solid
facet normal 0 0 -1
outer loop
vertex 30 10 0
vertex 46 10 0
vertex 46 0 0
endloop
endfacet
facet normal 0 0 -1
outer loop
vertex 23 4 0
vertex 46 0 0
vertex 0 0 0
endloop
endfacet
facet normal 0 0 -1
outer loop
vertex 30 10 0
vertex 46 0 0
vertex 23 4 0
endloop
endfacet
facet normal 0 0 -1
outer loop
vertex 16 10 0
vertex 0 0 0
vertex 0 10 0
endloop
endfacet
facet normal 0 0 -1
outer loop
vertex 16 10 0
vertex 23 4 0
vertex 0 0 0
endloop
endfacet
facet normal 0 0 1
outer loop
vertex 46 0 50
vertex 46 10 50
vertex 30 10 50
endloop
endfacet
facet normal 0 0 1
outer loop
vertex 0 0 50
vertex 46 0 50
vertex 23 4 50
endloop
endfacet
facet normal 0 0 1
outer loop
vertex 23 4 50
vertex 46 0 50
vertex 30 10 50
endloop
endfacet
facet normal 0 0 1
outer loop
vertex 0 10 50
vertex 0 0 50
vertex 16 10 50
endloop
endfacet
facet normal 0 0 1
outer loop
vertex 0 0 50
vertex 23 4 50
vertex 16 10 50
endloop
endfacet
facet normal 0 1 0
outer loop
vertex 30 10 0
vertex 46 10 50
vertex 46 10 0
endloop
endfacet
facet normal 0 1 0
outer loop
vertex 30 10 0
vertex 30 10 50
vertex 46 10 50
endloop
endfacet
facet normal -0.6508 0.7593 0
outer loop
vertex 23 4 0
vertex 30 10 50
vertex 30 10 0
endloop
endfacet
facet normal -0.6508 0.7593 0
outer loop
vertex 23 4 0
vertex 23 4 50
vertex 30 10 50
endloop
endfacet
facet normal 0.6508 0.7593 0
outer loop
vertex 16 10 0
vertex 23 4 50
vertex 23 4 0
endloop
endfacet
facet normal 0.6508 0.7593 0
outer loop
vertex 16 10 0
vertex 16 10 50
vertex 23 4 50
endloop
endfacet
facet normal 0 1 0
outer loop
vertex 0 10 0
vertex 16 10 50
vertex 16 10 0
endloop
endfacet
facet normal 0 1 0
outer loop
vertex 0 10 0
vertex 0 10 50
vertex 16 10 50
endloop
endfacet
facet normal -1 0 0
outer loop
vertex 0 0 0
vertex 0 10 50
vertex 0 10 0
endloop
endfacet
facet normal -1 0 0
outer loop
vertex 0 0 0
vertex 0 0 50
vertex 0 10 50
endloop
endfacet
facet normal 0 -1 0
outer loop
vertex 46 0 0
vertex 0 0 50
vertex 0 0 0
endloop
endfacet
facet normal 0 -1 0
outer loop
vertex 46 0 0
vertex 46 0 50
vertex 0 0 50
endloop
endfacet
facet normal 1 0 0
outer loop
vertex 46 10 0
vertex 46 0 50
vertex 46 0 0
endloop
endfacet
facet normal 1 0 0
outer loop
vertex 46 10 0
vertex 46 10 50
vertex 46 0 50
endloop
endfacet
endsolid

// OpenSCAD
$fn = 32;

// ----------------------------------------------------------------------
// V guide rail: vway, 46 mm wide
// ----------------------------------------------------------------------

// --- parameters (mm) ---
rail_w = 46;              // rail width, X
base_t = 10;              // base plate thickness
v_depth = 6;              // V feature depth / height
v_half_w = 7;             // half width of the V at the base face
plate_t = 50;             // rail length, Z (the extrusion height)

profile = [[0, 0], [46, 0], [46, 10], [30, 10], [23, 4], [16, 10], [0, 10]];  // primary outline, 7 points, counter clockwise

// --- the one profile operation ---
linear_extrude(height = plate_t) polygon(points = profile);
